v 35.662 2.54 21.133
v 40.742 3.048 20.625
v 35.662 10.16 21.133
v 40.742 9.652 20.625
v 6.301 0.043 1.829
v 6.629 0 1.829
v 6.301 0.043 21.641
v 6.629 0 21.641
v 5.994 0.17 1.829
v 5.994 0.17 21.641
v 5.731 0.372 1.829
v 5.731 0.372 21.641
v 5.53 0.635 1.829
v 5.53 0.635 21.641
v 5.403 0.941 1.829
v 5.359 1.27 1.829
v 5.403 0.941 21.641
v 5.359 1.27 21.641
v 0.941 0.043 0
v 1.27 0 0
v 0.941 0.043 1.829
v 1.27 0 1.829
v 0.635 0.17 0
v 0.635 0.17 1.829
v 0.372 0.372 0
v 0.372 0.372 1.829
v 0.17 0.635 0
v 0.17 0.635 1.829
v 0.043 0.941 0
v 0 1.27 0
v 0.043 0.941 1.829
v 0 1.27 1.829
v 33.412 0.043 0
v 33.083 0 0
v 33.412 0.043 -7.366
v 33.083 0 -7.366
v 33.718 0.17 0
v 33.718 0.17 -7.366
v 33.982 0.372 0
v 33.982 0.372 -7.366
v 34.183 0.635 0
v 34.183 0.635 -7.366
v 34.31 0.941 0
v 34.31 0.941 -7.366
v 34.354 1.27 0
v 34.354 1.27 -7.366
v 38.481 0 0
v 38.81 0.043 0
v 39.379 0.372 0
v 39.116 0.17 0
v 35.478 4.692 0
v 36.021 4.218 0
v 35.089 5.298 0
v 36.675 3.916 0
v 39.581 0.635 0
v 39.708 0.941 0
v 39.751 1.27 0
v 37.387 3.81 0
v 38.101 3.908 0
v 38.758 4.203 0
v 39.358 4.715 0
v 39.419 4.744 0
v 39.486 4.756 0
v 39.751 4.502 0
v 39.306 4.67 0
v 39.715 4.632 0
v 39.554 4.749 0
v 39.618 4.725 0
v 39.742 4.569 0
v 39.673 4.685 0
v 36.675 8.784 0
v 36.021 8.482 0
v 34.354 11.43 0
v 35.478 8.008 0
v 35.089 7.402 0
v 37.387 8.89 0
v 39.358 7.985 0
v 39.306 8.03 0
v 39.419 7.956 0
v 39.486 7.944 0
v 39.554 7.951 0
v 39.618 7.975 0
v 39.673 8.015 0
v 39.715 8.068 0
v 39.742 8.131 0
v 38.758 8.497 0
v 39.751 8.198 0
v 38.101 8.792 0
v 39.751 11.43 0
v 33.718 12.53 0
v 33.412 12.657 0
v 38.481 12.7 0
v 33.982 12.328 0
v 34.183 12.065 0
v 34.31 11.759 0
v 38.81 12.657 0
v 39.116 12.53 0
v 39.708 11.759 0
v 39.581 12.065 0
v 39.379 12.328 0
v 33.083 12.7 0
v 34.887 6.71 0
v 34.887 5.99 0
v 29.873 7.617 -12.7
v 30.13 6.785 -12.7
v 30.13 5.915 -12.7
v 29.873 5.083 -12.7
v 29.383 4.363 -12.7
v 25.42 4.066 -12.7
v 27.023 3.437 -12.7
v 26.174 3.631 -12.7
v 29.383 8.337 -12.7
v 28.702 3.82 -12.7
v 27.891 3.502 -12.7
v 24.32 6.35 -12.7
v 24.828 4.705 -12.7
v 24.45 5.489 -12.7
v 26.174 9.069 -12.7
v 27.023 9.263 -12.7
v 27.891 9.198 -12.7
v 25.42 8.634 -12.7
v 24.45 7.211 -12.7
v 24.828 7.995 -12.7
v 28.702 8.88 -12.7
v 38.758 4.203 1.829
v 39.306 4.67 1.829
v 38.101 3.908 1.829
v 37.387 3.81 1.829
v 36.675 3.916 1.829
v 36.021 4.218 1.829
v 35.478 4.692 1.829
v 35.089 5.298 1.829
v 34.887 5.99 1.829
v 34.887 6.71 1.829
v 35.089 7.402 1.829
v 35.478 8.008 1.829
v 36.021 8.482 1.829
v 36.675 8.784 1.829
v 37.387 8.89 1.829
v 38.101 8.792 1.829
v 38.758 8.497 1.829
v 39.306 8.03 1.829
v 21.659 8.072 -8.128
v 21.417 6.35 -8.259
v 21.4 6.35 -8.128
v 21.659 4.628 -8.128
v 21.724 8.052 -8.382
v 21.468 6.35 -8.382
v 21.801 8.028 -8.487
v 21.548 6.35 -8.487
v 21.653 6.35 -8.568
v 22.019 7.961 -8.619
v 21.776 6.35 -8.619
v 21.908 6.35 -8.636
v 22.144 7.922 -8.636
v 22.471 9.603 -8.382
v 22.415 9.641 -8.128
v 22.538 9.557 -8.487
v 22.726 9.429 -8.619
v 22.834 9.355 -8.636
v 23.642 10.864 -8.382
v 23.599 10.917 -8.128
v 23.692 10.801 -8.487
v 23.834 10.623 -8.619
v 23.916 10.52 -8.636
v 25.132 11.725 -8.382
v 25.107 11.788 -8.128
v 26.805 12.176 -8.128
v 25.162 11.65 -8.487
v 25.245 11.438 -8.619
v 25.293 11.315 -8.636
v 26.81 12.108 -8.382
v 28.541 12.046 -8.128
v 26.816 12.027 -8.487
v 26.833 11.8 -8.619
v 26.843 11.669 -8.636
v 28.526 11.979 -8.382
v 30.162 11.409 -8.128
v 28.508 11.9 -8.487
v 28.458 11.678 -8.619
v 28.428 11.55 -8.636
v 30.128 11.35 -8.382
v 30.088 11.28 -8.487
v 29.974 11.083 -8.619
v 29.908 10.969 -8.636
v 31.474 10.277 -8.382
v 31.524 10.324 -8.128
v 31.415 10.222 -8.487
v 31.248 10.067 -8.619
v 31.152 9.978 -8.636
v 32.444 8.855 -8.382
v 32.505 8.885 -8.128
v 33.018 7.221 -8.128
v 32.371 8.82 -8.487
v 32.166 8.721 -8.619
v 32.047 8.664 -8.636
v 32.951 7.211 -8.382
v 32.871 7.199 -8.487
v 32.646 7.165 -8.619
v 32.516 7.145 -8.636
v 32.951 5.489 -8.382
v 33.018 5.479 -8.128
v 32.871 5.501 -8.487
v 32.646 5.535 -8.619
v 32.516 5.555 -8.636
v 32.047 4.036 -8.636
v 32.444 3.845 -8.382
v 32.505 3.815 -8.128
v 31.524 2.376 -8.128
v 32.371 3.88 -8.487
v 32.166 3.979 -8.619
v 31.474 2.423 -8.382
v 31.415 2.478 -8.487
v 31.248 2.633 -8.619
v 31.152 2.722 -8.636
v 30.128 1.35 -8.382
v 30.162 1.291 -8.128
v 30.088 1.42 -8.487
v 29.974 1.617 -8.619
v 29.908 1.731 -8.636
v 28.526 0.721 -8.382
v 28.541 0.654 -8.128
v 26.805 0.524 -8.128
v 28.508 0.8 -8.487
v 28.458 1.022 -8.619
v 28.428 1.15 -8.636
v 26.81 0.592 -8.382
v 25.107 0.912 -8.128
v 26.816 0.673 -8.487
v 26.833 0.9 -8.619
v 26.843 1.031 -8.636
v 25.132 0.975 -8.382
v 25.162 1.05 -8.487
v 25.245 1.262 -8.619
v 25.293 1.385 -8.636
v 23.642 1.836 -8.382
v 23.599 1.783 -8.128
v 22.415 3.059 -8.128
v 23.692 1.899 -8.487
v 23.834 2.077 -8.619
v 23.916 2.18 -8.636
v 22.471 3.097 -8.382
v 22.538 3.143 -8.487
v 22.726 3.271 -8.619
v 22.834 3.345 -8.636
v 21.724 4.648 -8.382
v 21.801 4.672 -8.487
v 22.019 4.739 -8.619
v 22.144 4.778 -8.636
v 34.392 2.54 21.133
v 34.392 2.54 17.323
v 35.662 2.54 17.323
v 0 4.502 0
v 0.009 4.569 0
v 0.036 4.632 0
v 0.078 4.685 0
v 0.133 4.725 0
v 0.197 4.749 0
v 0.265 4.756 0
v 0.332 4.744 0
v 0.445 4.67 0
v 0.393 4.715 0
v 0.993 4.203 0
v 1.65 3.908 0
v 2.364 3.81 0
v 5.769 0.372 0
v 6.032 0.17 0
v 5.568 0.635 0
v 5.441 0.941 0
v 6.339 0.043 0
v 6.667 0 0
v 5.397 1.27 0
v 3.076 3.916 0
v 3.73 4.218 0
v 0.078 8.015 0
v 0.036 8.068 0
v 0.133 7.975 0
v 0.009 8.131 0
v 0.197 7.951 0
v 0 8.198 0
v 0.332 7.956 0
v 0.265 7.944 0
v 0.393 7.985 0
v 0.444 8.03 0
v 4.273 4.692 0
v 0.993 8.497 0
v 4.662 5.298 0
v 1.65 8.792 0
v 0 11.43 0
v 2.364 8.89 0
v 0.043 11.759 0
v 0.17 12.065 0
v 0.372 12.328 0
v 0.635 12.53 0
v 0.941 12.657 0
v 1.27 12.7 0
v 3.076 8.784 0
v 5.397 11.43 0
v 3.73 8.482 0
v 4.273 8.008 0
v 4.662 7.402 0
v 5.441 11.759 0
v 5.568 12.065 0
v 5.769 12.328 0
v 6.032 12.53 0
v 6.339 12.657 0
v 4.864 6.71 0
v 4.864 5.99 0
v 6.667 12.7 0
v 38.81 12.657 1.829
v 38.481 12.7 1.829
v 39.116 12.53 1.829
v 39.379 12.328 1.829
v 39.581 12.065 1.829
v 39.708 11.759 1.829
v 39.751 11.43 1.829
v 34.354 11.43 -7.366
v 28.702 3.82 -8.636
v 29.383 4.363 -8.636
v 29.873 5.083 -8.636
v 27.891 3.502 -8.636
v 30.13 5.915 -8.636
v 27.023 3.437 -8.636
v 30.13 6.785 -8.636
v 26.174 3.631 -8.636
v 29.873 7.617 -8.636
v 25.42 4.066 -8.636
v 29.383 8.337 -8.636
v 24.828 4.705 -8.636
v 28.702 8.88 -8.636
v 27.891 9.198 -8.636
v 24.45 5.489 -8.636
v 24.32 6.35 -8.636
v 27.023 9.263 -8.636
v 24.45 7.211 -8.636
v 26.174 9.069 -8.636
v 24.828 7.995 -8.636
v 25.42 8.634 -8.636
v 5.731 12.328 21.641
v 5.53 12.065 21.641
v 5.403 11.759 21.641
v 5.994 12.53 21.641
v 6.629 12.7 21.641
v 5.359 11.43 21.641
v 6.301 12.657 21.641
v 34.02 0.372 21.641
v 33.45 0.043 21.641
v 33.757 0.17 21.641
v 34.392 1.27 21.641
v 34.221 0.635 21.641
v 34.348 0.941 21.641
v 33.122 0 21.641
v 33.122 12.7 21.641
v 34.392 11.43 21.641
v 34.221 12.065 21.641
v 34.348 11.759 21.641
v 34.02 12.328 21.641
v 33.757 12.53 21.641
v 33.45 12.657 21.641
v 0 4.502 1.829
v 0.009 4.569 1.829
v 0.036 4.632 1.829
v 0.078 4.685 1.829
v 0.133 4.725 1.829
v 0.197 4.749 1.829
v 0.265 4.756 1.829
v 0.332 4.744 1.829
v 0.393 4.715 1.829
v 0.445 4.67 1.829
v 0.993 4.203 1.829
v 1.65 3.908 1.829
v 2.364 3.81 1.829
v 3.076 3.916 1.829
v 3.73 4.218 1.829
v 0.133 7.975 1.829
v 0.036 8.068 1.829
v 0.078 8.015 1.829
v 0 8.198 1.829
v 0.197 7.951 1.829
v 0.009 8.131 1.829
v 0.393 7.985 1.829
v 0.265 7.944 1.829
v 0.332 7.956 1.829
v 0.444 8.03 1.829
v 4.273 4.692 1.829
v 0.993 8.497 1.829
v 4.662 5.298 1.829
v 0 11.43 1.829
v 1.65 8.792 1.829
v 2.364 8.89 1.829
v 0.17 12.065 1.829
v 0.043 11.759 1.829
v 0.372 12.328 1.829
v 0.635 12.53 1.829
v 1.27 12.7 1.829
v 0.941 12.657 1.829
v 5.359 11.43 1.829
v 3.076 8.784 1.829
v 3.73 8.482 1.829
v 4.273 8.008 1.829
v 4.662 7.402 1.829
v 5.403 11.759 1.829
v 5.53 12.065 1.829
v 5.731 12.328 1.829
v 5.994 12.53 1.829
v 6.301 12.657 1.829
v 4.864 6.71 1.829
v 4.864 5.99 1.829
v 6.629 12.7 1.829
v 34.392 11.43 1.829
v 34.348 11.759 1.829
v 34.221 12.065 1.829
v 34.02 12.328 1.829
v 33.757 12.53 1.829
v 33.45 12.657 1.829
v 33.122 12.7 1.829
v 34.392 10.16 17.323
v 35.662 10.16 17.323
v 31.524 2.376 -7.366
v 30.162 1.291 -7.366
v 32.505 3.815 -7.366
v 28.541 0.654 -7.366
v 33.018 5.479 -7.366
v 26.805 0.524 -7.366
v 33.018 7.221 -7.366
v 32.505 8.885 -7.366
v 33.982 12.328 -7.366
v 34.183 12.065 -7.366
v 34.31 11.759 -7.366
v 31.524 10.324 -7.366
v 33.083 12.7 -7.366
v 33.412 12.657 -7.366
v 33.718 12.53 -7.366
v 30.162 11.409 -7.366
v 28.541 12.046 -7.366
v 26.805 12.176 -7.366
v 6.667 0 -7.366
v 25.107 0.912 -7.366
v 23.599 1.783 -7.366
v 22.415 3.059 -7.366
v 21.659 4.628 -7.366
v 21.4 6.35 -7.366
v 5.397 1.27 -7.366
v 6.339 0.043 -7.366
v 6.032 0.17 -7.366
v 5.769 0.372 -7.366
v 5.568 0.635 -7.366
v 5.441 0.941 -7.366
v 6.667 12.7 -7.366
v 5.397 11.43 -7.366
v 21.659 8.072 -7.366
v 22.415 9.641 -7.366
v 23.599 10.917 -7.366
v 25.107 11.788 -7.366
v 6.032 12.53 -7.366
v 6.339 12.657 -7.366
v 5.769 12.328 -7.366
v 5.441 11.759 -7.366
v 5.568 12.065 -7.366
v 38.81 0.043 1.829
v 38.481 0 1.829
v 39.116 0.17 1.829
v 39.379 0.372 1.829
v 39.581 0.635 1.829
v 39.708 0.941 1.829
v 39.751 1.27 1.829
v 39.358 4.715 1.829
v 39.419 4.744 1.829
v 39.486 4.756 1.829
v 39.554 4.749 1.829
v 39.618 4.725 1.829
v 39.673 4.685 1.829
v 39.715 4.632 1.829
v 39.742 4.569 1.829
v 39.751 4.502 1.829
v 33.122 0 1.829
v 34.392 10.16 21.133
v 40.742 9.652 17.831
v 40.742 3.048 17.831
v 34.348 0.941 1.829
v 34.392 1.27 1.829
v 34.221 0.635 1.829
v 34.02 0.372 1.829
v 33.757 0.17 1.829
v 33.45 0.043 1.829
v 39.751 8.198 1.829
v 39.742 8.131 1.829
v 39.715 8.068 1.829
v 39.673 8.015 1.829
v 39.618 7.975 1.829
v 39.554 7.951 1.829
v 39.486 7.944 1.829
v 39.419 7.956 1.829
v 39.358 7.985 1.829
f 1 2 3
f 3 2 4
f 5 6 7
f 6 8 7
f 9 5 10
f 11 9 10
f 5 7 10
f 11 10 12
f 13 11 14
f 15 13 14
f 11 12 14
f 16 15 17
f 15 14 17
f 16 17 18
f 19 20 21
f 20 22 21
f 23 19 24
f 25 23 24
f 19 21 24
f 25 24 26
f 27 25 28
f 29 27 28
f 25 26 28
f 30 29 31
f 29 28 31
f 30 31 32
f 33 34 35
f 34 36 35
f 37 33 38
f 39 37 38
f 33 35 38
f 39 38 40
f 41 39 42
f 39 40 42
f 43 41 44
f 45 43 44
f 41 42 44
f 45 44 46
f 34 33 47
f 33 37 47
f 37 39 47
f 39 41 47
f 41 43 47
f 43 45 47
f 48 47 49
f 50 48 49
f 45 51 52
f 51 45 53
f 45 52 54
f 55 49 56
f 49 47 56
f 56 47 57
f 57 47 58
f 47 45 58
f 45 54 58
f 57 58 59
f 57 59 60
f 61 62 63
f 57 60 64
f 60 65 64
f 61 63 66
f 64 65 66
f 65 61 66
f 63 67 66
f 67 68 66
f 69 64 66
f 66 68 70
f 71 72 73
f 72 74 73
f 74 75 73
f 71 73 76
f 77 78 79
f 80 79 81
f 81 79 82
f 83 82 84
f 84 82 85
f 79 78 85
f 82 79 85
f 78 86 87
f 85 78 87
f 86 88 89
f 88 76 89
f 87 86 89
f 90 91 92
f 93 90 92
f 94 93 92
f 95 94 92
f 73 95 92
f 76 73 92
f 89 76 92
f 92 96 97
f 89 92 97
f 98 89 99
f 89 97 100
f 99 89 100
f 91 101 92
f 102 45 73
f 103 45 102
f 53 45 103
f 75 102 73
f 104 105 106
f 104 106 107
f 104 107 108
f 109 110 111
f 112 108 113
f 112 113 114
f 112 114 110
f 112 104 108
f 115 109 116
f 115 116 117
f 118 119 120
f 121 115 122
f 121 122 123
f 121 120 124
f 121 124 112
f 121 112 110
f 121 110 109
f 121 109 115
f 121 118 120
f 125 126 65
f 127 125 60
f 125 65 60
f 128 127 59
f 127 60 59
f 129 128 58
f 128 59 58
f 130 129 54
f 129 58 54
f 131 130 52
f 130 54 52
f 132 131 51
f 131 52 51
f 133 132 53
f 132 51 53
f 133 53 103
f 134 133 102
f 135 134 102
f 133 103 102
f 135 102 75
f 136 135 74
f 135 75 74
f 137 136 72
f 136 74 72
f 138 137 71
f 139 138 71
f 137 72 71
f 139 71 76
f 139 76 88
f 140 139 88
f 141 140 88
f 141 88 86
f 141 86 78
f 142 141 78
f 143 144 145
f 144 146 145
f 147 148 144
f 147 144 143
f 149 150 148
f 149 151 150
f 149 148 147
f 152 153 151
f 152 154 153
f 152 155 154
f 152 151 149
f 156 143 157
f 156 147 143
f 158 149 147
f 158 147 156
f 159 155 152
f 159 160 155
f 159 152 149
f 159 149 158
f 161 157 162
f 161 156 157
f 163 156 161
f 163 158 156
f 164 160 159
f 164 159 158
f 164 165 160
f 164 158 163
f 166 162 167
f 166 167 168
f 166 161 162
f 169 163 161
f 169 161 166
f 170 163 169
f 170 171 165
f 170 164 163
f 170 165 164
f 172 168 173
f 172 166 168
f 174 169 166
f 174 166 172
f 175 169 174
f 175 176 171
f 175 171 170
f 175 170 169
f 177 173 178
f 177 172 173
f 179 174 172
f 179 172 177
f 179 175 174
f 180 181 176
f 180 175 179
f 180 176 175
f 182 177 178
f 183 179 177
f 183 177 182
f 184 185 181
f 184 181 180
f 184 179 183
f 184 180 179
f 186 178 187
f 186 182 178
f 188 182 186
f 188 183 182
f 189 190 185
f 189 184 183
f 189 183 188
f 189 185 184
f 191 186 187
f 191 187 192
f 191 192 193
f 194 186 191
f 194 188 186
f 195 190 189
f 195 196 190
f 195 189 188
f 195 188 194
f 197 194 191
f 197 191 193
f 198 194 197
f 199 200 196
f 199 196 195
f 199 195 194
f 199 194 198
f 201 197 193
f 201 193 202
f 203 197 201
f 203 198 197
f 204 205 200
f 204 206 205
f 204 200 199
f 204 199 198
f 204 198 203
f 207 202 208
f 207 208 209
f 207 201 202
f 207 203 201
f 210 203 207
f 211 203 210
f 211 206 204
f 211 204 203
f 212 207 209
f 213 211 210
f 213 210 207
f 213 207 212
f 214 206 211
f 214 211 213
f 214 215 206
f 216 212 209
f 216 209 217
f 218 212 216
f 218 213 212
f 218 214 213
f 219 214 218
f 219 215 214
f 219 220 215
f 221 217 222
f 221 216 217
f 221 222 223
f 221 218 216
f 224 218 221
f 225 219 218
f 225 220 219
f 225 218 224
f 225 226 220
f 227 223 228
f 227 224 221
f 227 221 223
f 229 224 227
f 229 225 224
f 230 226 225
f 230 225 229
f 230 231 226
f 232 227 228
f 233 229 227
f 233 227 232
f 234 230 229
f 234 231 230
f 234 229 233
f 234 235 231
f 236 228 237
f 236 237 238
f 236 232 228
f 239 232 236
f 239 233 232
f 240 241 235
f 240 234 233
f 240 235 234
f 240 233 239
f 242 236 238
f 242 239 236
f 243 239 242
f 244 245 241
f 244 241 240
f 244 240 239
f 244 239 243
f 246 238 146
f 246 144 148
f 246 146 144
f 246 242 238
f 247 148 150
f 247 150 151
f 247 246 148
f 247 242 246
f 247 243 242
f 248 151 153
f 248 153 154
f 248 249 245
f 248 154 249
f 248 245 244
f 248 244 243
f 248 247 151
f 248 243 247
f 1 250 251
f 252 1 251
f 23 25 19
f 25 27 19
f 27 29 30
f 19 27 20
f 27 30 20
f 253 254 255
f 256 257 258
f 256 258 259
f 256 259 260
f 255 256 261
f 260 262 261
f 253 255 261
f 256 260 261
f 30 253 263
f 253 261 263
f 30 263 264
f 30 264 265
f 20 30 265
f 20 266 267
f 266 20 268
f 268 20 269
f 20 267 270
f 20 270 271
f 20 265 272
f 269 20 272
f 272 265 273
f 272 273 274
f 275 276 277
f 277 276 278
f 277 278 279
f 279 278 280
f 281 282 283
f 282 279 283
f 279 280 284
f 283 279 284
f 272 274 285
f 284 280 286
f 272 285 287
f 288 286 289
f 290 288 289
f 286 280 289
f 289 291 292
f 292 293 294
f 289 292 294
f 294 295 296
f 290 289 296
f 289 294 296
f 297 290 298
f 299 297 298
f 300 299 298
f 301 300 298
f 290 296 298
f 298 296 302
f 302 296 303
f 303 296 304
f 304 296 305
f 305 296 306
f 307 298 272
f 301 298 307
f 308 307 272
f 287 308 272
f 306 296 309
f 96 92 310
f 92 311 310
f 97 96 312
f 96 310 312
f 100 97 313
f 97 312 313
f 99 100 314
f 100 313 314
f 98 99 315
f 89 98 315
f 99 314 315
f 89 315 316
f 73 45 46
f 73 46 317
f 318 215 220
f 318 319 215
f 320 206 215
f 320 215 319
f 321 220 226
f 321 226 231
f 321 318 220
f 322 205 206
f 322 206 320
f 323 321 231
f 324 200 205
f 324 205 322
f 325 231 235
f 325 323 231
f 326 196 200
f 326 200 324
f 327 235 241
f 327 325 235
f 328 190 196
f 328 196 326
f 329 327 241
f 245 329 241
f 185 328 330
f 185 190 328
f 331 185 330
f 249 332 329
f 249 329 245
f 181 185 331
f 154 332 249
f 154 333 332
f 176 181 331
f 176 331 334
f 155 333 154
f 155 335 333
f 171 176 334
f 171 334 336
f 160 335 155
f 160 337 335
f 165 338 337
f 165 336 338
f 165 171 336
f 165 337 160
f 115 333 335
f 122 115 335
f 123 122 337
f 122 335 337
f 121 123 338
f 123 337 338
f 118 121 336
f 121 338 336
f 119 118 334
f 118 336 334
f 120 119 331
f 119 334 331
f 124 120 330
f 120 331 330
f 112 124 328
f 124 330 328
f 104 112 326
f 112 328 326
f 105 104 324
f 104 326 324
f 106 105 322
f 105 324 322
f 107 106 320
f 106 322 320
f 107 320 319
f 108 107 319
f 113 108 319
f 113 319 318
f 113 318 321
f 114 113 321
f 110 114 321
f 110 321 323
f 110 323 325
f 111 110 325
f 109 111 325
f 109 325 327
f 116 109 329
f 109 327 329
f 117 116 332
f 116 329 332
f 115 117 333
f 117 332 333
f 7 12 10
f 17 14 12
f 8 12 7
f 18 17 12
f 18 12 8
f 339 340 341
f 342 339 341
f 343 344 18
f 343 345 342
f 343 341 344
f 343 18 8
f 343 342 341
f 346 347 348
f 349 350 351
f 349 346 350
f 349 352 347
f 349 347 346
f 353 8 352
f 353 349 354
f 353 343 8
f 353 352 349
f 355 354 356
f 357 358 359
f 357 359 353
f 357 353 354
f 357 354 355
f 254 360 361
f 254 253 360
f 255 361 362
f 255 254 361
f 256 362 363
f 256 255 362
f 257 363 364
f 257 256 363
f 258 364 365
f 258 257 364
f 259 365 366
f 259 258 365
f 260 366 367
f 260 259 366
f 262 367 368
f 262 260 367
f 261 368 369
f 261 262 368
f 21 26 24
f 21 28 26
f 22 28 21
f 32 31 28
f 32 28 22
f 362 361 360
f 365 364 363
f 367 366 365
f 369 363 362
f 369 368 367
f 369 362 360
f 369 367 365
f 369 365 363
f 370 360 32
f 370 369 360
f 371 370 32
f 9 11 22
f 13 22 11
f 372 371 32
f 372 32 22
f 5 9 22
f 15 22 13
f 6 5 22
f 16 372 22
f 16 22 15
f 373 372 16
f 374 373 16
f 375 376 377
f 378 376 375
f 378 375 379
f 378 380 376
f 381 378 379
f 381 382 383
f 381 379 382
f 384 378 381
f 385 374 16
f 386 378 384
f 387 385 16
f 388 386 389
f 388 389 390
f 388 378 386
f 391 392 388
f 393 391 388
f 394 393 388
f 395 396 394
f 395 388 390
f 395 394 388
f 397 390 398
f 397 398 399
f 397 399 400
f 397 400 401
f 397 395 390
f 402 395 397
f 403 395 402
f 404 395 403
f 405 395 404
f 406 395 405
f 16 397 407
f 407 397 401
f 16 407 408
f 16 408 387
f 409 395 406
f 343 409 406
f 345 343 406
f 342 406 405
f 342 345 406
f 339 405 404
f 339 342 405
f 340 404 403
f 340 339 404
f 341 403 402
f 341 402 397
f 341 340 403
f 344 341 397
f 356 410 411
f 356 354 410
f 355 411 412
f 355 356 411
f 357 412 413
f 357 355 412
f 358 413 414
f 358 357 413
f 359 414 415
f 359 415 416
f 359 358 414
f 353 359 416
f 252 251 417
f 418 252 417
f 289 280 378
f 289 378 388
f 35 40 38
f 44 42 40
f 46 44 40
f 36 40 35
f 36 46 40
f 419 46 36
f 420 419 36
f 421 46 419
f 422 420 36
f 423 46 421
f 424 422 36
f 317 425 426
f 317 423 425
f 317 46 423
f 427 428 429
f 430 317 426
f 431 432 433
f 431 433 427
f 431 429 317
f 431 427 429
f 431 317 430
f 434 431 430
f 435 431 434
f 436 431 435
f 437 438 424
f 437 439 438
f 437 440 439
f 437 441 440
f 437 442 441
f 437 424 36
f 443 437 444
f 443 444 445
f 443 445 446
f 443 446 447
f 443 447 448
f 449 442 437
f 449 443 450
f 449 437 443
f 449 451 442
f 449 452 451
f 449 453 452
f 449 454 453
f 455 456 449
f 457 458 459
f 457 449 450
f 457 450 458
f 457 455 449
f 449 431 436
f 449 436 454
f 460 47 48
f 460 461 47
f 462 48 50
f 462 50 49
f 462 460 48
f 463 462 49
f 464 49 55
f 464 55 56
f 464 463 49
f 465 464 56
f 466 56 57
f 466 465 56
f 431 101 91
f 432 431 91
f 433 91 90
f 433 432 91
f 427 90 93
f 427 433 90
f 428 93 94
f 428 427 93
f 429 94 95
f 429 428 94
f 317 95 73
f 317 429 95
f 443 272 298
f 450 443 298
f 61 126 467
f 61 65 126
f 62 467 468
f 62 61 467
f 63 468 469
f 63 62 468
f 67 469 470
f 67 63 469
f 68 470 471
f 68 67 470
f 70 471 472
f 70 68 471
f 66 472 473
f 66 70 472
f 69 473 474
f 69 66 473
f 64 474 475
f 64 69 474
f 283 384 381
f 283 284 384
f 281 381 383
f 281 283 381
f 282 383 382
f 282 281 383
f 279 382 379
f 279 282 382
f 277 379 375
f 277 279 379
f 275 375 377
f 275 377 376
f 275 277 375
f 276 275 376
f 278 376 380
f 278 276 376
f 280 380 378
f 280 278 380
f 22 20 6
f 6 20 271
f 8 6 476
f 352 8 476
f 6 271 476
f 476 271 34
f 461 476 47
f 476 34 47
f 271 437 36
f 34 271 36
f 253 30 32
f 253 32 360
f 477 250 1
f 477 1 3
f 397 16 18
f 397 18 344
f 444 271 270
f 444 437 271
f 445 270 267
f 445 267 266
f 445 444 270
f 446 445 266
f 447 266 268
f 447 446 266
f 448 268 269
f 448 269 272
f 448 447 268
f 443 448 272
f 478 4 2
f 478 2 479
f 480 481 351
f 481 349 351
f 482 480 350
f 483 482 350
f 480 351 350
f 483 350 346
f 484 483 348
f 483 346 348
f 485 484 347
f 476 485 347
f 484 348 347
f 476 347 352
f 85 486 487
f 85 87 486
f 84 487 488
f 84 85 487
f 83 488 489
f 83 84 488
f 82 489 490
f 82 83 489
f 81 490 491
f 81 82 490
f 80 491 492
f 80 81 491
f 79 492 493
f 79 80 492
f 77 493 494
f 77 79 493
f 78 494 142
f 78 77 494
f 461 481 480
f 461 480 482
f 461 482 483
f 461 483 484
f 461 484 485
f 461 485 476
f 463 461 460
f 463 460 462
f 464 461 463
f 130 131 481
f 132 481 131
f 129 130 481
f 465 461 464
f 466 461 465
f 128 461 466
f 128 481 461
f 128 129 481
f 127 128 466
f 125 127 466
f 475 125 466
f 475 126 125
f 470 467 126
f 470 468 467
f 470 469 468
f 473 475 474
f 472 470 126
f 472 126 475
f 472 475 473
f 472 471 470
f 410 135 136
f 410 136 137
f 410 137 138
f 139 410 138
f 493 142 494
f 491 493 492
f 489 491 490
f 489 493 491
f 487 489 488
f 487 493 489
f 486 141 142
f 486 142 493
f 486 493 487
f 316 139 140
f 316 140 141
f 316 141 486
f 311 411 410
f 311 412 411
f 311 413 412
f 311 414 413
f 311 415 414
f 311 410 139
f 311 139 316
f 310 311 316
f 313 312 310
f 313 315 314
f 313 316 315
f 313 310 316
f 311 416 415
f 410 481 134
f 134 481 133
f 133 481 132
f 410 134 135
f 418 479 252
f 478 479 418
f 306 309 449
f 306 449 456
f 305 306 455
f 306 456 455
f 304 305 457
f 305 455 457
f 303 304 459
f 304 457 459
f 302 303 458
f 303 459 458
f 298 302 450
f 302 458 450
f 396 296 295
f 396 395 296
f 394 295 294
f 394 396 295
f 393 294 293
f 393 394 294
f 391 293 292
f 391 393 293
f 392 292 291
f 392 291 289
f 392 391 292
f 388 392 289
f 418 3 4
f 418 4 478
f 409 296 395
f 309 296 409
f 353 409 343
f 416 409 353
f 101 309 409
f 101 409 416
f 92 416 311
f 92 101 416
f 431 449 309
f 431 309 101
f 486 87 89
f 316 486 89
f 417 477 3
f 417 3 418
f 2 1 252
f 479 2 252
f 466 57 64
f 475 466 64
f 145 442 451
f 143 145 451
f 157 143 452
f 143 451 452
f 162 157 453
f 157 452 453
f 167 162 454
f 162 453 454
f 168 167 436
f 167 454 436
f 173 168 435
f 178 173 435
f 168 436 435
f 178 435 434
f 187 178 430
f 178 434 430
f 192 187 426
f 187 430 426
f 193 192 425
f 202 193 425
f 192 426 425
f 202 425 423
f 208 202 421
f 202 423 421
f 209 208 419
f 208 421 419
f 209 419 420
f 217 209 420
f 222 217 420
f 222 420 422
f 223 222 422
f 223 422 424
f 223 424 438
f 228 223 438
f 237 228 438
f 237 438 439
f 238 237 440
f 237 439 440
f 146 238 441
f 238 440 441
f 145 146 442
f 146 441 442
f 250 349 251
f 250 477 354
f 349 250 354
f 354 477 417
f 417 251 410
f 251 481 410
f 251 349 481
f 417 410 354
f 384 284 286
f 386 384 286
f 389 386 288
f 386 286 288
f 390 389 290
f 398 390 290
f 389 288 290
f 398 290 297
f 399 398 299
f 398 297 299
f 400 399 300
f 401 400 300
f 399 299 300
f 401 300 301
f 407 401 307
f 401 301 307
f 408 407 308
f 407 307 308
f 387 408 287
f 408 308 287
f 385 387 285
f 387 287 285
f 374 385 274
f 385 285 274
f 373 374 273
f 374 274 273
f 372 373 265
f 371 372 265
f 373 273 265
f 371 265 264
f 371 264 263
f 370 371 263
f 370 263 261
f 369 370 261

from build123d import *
from OCP.BRepFilletAPI import BRepFilletAPI_MakeChamfer

# Parameters (mm, degrees)
SKETCH1_W           = 39.751
SKETCH1_H           = 12.7
BOSS_EXTRUDE1_DEPTH = 1.8288
SKETCH2_W           = 29.0322
SKETCH2_H           = 12.7
BOSS_EXTRUDE2_DEPTH = 19.812
SKETCH3_W           = 28.956
SKETCH3_H           = 12.7
BOSS_EXTRUDE3_DEPTH = 7.366
SKETCH4_R           = 5.842
BOSS_EXTRUDE4_DEPTH = 1.27
SKETCH5_R           = 2.921
BOSS_EXTRUDE5_DEPTH = 4.064
SKETCH6_W           = 3.81
SKETCH6_H           = 7.62
BOSS_EXTRUDE6_DEPTH = 6.35
CHAMFER1_SIZE       = 5.08
CHAMFER1_SIZE2      = 0.508
FILLET1_R           = 1.27
CUT_EXTRUDE1_REACH  = 49.849
SKETCH7_R           = 2.54
FILLET2_R           = 0.254
FILLET3_R           = 0.508


with BuildPart() as part:
    # Sketch1 → Boss-Extrude1 (new body)
    with BuildSketch(Plane.XY):
        with Locations((19.8755, 6.35)):
            Rectangle(SKETCH1_W, SKETCH1_H)
    extrude(amount=BOSS_EXTRUDE1_DEPTH)

    # Sketch2 → Boss-Extrude2 (add)
    with BuildSketch(Plane.XY.offset(1.8288)):
        with Locations((19.8755, 6.35)):
            Rectangle(SKETCH2_W, SKETCH2_H)
    extrude(amount=BOSS_EXTRUDE2_DEPTH)

    # Sketch3 → Boss-Extrude3 (add)
    with BuildSketch(Plane(origin=(0, 0, 0), x_dir=(-1, 0, 0), z_dir=(0, 0, -1))):
        with Locations((-19.8755, 6.35)):
            Rectangle(SKETCH3_W, SKETCH3_H)
    extrude(amount=BOSS_EXTRUDE3_DEPTH)

    # Sketch4 → Boss-Extrude4 (add)
    with BuildSketch(Plane(origin=(0, 0, -7.366), x_dir=(-1, 0, 0), z_dir=(0, 0, -1))):
        with Locations((-27.2415, 6.35)):
            Circle(SKETCH4_R)
    extrude(amount=BOSS_EXTRUDE4_DEPTH)

    # Sketch5 → Boss-Extrude5 (add)
    with BuildSketch(Plane(origin=(0, 0, -8.636), x_dir=(-1, 0, 0), z_dir=(0, 0, -1))):
        with Locations((-27.2415, 6.35)):
            Circle(SKETCH5_R)
    extrude(amount=BOSS_EXTRUDE5_DEPTH)

    # Sketch6 → Boss-Extrude6 (add)
    with BuildSketch(Plane(origin=(34.3916, 0, 0), x_dir=(0, 0, -1), z_dir=(1, 0, 0))):
        with Locations((-19.2278, 6.35)):
            Rectangle(SKETCH6_W, SKETCH6_H)
    extrude(amount=BOSS_EXTRUDE6_DEPTH)

    # Chamfer1: one chamfer whose edges measure the first distance from different faces: ONE call of the kernel's chamfer builder (chamfer() names one face for all edges)
    chamfer1_edges_1 = [part.edges().sort_by_distance(p)[0] for p in [
        (40.7416, 6.35, 21.1328),
    ]]
    chamfer1_side_1 = [part.faces().sort_by_distance(p)[0] for p in [
        (37.5666, 6.35, 21.1328),
    ]]
    chamfer1_edges_2 = [part.edges().sort_by_distance(p)[0] for p in [
        (40.7416, 2.54, 19.2278),
    ]]
    chamfer1_side_2 = [part.faces().sort_by_distance(p)[0] for p in [
        (37.5666, 2.54, 19.2278),
    ]]
    chamfer1_edges_3 = [part.edges().sort_by_distance(p)[0] for p in [
        (40.7416, 6.35, 17.3228),
    ]]
    chamfer1_side_3 = [part.faces().sort_by_distance(p)[0] for p in [
        (37.5666, 6.35, 17.3228),
    ]]
    chamfer1_edges_4 = [part.edges().sort_by_distance(p)[0] for p in [
        (40.7416, 10.16, 19.2278),
    ]]
    chamfer1_side_4 = [part.faces().sort_by_distance(p)[0] for p in [
        (37.5666, 10.16, 19.2278),
    ]]
    chamfer1 = BRepFilletAPI_MakeChamfer(part.part.solid().wrapped)
    for e in chamfer1_edges_1:
        chamfer1.Add(CHAMFER1_SIZE, CHAMFER1_SIZE2, e.wrapped, chamfer1_side_1[0].wrapped)  # the first distance lies on this face
    for e in chamfer1_edges_2:
        chamfer1.Add(CHAMFER1_SIZE, CHAMFER1_SIZE2, e.wrapped, chamfer1_side_2[0].wrapped)  # the first distance lies on this face
    for e in chamfer1_edges_3:
        chamfer1.Add(CHAMFER1_SIZE, CHAMFER1_SIZE2, e.wrapped, chamfer1_side_3[0].wrapped)  # the first distance lies on this face
    for e in chamfer1_edges_4:
        chamfer1.Add(CHAMFER1_SIZE, CHAMFER1_SIZE2, e.wrapped, chamfer1_side_4[0].wrapped)  # the first distance lies on this face
    add(Compound.cast(chamfer1.Shape()), mode=Mode.REPLACE)

    # Fillet1
    fillet1_edges = [part.edges().sort_by_distance(p)[0] for p in [
        (5.3594, 12.7, 11.7348),
        (5.3594, 0, 11.7348),
        (34.3916, 0, 11.7348),
        (34.3916, 12.7, 11.7348),
        (34.3535, 12.7, -3.683),
        (34.3535, 0, -3.683),
        (5.3975, 0, -3.683),
        (5.3975, 12.7, -3.683),
        (0, 0, 0.9144),
        (39.751, 0, 0.9144),
        (39.751, 12.7, 0.9144),
        (0, 12.7, 0.9144),
    ]]
    fillet(fillet1_edges, radius=FILLET1_R)

    # Sketch7 → Cut-Extrude1 (cut, up to next)
    with BuildSketch(Plane(origin=(0, 0, 0), x_dir=(-1, 0, 0), z_dir=(0, 0, -1)), mode=Mode.PRIVATE) as cut_extrude1_sk1:
        with Locations((-37.4015, 6.35)):
            Circle(SKETCH7_R)
    cut_extrude1_tool1 = extrude(cut_extrude1_sk1.sketch, amount=-CUT_EXTRUDE1_REACH, mode=Mode.PRIVATE) & part.part
    # Sketch7 → Cut-Extrude1 (cut, up to next)
    with BuildSketch(Plane(origin=(0, 0, 0), x_dir=(-1, 0, 0), z_dir=(0, 0, -1)), mode=Mode.PRIVATE) as cut_extrude1_sk2:
        with Locations((-2.3495, 6.35)):
            Circle(SKETCH7_R)
    cut_extrude1_tool2 = extrude(cut_extrude1_sk2.sketch, amount=-CUT_EXTRUDE1_REACH, mode=Mode.PRIVATE) & part.part
    add(cut_extrude1_tool1.solids().sort_by_distance((37.4015, 6.35, 0))[0], mode=Mode.SUBTRACT)
    add(cut_extrude1_tool2.solids().sort_by_distance((2.3495, 6.35, 0))[0], mode=Mode.SUBTRACT)

    # Fillet2
    fillet2_edges = [part.edges().sort_by_distance(p)[0] for p in [
        (39.751, 7.315116444, 0.9144),
        (39.751, 5.384883556, 0.9144),
        (0, 7.315116444, 0.9144),
        (0, 5.384883556, 0.9144),
    ]]
    fillet(fillet2_edges, radius=FILLET2_R)

    # Fillet3
    fillet3_edges = [part.edges().sort_by_distance(p)[0] for p in [
        (33.0835, 6.35, -8.636),
    ]]
    fillet(fillet3_edges, radius=FILLET3_R)


solid = part.part
